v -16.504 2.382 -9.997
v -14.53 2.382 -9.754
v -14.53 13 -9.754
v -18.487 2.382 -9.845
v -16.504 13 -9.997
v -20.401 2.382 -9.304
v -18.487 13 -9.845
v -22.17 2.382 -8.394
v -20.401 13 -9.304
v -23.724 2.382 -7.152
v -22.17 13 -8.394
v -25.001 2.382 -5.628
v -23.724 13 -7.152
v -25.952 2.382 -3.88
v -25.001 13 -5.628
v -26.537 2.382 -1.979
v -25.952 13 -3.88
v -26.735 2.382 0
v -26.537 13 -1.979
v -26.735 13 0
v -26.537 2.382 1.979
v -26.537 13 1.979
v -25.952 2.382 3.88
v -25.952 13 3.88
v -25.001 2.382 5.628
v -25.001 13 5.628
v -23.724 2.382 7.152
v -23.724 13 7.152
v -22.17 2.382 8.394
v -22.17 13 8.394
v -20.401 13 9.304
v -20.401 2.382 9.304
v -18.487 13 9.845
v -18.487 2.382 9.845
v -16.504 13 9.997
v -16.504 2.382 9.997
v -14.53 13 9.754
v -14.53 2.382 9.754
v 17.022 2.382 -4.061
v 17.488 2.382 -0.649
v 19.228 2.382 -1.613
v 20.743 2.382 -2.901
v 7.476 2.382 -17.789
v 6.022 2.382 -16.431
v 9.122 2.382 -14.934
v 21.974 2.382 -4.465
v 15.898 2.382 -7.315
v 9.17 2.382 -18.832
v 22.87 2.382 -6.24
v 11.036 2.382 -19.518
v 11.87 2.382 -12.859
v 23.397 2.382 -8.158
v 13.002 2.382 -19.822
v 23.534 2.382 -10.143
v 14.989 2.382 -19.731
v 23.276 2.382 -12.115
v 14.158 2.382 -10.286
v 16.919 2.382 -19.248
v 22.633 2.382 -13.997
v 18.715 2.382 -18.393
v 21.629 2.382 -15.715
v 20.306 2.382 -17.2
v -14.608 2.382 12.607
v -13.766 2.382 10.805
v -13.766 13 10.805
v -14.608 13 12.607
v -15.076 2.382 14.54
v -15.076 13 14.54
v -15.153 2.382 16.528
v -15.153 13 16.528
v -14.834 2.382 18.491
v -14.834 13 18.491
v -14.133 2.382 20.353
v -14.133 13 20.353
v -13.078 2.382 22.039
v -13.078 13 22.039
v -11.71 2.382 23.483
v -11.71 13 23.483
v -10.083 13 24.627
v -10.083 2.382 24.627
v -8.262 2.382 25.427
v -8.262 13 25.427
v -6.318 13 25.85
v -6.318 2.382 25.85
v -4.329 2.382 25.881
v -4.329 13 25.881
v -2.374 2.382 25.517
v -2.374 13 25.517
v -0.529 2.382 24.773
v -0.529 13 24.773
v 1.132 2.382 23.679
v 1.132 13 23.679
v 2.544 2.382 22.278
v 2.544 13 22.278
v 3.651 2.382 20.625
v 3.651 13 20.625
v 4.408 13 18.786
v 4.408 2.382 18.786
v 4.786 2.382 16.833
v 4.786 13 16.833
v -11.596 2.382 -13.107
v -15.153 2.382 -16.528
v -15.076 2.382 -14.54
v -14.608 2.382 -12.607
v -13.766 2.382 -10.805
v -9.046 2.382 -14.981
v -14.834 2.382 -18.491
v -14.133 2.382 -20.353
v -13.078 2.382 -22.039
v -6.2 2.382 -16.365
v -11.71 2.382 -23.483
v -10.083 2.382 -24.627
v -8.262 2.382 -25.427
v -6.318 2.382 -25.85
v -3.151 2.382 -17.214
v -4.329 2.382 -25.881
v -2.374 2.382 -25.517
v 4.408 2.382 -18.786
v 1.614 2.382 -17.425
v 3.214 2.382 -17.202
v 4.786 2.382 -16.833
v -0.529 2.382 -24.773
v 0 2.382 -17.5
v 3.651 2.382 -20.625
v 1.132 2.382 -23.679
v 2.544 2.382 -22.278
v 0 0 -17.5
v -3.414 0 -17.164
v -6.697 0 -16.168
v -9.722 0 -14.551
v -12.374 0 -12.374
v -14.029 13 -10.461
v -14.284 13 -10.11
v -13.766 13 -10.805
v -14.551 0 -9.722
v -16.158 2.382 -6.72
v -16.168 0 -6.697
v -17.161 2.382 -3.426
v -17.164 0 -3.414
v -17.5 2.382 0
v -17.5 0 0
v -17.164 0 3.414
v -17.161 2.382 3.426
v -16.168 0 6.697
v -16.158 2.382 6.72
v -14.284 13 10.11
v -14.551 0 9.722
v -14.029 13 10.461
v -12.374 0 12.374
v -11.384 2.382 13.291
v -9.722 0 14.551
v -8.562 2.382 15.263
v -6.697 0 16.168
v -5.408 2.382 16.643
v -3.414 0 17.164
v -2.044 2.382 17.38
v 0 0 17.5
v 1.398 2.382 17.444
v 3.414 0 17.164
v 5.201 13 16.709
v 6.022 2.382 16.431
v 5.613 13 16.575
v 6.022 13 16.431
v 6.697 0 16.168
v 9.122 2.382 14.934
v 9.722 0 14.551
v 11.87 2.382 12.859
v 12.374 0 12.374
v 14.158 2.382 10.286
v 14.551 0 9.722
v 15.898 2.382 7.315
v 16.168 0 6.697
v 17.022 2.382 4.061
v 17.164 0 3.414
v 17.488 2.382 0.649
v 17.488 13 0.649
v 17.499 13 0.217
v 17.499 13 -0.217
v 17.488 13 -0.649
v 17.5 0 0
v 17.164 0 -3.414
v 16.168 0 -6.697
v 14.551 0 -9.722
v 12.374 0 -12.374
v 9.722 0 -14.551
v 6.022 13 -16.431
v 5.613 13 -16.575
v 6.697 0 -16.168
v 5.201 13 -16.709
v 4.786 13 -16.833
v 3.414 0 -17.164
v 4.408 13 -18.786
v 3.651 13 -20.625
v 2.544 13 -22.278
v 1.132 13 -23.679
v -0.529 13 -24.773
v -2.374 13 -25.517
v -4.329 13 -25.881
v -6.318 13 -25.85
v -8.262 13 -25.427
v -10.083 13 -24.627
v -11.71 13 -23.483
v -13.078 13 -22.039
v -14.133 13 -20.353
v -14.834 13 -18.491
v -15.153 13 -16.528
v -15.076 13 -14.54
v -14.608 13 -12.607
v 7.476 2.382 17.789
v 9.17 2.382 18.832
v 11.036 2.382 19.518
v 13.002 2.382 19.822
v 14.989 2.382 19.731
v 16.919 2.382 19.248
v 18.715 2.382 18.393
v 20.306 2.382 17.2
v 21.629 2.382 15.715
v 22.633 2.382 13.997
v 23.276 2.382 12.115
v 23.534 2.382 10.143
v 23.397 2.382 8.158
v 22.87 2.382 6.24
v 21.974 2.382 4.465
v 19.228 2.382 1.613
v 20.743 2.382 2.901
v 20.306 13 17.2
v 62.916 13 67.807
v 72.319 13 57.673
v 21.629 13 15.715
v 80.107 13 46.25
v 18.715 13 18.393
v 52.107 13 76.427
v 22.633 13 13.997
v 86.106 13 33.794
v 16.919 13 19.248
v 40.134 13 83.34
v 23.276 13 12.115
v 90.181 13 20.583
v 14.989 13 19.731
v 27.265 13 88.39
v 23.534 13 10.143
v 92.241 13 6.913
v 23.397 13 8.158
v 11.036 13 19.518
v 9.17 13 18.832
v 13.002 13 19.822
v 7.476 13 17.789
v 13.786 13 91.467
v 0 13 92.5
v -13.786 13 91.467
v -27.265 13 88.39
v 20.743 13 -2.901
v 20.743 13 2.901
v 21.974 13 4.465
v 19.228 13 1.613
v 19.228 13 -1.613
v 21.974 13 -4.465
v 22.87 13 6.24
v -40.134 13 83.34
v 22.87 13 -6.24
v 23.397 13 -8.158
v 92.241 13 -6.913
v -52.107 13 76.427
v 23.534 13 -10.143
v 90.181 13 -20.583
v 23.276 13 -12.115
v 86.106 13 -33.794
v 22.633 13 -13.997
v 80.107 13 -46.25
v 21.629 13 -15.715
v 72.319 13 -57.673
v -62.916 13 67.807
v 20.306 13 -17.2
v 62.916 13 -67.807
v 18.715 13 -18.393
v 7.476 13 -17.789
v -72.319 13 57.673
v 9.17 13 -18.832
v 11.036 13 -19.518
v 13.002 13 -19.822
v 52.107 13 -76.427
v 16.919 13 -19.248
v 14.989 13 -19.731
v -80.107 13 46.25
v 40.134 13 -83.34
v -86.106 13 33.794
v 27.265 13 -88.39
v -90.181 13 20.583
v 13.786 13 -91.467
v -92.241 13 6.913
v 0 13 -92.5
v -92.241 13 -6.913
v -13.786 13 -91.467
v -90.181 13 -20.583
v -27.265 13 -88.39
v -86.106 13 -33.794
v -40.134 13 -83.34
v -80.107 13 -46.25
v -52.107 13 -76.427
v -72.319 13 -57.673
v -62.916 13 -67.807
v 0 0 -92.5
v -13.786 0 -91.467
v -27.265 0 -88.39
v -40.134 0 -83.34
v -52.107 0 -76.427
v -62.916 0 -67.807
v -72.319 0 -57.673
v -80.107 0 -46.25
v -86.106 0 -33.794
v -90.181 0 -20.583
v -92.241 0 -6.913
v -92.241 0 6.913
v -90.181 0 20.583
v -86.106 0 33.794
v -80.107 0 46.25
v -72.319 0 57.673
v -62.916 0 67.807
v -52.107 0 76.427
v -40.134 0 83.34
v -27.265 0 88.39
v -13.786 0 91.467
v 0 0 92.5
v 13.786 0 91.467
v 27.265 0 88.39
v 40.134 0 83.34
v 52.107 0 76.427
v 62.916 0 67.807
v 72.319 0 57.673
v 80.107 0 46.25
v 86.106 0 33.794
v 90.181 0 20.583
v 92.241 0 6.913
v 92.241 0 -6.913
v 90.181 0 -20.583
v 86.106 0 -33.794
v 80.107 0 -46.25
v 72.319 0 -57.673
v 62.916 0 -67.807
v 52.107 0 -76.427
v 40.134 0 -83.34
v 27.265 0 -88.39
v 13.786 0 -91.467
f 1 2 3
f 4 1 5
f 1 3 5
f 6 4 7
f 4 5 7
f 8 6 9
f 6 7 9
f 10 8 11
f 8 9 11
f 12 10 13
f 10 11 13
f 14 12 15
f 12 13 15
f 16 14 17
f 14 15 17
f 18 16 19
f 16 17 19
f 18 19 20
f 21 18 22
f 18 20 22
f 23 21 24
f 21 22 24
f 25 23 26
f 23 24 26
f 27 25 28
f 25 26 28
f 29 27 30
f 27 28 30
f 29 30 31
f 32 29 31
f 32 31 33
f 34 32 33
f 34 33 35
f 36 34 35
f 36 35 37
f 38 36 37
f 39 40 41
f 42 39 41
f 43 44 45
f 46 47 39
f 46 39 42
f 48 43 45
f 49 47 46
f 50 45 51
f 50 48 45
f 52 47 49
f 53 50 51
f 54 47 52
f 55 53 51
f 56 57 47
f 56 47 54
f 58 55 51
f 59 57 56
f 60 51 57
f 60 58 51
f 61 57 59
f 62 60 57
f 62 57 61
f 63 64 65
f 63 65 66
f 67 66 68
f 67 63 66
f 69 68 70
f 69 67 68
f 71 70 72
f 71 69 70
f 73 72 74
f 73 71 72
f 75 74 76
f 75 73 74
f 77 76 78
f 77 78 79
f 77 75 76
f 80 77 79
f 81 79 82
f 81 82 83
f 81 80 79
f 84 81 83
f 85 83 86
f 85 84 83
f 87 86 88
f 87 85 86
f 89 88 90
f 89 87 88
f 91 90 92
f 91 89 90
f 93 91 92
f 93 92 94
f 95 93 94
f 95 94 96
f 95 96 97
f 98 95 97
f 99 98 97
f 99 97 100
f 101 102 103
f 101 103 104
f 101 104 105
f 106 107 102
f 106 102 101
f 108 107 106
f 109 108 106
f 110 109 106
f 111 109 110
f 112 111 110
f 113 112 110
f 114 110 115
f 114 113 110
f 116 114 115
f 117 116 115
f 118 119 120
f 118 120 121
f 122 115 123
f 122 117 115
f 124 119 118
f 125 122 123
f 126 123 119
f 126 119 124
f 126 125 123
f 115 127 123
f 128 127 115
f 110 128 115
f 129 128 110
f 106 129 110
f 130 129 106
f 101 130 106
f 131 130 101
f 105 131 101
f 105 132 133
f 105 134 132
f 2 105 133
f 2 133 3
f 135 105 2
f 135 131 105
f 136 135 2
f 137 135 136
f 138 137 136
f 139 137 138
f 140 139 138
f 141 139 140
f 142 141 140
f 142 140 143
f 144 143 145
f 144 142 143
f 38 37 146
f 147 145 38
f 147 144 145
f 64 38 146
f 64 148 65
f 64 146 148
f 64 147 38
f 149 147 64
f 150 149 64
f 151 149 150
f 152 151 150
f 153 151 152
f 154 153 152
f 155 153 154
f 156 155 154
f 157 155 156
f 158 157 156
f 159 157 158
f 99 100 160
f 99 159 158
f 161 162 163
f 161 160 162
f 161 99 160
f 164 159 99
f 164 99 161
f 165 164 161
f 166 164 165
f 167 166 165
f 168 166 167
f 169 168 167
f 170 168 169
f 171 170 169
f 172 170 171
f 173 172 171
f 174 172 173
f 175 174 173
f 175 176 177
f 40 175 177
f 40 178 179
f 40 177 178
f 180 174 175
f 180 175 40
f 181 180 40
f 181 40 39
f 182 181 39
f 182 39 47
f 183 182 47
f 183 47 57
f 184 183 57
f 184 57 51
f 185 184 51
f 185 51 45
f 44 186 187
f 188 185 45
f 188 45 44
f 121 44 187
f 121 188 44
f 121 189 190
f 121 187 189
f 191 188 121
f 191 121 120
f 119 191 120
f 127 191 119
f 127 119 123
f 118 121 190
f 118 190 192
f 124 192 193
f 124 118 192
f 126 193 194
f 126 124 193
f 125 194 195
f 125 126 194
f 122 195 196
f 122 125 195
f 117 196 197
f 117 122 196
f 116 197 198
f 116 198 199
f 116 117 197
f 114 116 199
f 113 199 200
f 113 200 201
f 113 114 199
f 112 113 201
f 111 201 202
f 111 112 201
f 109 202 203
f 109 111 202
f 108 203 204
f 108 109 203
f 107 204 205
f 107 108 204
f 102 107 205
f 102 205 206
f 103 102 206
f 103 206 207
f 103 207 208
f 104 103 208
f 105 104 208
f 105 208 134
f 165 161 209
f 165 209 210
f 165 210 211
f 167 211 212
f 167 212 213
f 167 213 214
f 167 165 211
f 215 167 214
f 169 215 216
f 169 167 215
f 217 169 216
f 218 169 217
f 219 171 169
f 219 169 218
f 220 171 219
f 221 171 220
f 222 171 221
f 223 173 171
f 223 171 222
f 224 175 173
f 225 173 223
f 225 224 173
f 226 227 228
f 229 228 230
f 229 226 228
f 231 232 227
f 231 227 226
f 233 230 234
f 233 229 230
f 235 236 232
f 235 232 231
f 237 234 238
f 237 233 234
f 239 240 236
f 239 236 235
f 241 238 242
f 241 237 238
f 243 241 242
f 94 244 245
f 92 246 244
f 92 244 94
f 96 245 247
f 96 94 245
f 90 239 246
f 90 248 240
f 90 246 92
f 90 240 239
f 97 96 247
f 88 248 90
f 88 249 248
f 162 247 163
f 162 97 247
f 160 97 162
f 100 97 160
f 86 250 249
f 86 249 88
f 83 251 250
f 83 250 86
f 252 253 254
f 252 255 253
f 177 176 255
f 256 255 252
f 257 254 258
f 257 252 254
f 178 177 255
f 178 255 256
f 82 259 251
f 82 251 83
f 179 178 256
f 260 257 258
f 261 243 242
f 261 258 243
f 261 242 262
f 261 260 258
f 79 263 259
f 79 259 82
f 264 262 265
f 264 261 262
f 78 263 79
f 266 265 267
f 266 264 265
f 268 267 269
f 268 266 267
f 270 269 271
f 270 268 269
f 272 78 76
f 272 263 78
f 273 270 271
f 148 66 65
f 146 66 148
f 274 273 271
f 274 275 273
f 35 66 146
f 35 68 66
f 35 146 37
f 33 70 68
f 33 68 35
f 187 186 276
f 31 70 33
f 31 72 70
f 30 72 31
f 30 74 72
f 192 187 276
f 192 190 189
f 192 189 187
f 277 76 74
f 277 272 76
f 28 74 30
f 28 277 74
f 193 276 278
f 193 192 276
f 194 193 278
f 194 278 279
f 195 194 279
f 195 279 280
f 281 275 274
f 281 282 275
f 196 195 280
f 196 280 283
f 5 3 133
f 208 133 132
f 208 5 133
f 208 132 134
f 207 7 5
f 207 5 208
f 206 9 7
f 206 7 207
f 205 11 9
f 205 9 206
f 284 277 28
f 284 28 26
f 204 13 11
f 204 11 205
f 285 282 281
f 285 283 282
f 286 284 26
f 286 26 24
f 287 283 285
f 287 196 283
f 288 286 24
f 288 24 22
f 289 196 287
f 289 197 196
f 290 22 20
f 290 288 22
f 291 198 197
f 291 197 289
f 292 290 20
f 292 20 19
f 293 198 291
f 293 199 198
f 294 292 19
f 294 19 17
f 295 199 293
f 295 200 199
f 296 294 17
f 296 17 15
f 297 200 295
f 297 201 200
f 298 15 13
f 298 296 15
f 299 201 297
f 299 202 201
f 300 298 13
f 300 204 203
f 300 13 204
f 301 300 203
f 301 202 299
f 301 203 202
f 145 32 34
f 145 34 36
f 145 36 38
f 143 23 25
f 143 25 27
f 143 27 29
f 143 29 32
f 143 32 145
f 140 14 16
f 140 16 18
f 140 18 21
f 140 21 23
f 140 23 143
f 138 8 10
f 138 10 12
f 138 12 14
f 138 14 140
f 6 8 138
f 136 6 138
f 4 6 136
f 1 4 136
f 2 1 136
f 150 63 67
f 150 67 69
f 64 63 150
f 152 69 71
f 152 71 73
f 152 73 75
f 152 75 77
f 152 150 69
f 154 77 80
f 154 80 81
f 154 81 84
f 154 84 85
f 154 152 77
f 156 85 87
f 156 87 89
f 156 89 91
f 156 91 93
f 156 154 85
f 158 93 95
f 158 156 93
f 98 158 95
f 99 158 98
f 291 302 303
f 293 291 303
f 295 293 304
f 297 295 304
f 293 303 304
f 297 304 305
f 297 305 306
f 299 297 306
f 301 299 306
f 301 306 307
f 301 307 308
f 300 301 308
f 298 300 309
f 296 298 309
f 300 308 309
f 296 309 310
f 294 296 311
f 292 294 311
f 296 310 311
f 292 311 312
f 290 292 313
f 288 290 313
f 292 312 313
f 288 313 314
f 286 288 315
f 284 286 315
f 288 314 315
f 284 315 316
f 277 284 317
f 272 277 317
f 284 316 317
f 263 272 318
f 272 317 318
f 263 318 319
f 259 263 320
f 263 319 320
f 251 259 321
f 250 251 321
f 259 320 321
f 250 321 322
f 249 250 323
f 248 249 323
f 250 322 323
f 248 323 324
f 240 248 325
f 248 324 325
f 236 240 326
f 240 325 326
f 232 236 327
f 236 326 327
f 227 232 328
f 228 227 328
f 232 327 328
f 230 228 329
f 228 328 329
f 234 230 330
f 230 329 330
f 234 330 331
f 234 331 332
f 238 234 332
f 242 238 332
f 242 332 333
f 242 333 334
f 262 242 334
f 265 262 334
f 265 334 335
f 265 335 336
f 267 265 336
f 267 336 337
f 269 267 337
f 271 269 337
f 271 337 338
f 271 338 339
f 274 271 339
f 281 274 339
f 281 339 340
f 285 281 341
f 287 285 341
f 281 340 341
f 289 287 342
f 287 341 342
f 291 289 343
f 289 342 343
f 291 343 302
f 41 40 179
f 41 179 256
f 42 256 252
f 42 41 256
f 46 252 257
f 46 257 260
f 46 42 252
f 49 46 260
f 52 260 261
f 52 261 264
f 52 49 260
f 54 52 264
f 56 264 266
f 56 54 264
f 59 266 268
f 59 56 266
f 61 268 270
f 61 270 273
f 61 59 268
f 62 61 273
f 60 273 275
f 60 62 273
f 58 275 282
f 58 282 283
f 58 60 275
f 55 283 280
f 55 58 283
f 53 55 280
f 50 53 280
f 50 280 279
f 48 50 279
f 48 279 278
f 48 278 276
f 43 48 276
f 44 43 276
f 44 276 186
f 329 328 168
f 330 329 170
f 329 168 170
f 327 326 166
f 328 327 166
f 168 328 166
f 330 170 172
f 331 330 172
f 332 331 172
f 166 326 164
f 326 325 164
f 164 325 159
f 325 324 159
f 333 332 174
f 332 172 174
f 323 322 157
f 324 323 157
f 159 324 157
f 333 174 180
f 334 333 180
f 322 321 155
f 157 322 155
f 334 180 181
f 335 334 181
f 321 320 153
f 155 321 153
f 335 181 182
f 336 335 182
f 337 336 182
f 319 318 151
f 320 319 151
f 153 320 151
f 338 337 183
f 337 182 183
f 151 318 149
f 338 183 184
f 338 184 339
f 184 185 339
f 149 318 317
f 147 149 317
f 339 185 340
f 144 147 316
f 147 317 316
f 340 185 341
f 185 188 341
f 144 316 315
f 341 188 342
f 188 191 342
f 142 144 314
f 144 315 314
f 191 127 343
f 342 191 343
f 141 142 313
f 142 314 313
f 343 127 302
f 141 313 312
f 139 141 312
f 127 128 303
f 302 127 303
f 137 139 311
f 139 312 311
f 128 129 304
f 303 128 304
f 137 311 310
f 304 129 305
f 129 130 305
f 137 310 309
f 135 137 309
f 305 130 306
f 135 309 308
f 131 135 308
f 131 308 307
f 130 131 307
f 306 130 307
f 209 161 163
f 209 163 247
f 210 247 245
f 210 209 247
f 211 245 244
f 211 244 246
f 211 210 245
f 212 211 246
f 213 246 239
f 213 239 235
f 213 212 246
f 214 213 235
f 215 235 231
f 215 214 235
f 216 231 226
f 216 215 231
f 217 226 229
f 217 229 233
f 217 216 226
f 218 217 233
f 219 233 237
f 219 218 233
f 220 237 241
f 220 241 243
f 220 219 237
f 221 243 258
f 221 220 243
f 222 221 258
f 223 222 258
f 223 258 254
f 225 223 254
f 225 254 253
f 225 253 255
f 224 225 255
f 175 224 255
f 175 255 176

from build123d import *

# Parameters (mm, degrees)
SKETCH1_R           = 92.5
BOSS_EXTRUDE1_DEPTH = 13
SKETCH2_R           = 17.5
CUT_EXTRUDE1_DEPTH  = 132.459119121
SKETCH3_R           = 10
CUT_EXTRUDE2_DEPTH  = 10.618281544
CIRPATTERN1_COUNT   = 5


with BuildPart() as part:
    # Sketch1 → Boss-Extrude1 (new body)
    with BuildSketch(Plane(origin=(0, 0, 0), x_dir=(1, 0, 0), z_dir=(0, 1, 0))):
        Circle(SKETCH1_R)
    extrude(amount=BOSS_EXTRUDE1_DEPTH)

    # Sketch2 → Cut-Extrude1 (cut, through all)
    with BuildSketch(Plane(origin=(0, 0, 0), x_dir=(1, 0, 0), z_dir=(0, 1, 0))):
        Circle(SKETCH2_R)
    extrude(amount=CUT_EXTRUDE1_DEPTH, mode=Mode.SUBTRACT)

    # Sketch3 → Cut-Extrude2 (cut)
    with BuildSketch(Plane(origin=(0, 13, 0), x_dir=(1, 0, 0), z_dir=(0, 1, 0))):
        with Locations((-16.735268537, 0)):
            Circle(SKETCH3_R)
    cut_extrude2 = extrude(amount=-CUT_EXTRUDE2_DEPTH, mode=Mode.SUBTRACT)

    # CirPattern1: Cut-Extrude2 ×5 about axis
    cirpattern1_axis = Axis((0, 0, 0), (0, 1, 0))
    for i in range(1, CIRPATTERN1_COUNT):
        add(cut_extrude2.rotate(cirpattern1_axis, i * 360 / CIRPATTERN1_COUNT), mode=Mode.SUBTRACT)


solid = part.part
